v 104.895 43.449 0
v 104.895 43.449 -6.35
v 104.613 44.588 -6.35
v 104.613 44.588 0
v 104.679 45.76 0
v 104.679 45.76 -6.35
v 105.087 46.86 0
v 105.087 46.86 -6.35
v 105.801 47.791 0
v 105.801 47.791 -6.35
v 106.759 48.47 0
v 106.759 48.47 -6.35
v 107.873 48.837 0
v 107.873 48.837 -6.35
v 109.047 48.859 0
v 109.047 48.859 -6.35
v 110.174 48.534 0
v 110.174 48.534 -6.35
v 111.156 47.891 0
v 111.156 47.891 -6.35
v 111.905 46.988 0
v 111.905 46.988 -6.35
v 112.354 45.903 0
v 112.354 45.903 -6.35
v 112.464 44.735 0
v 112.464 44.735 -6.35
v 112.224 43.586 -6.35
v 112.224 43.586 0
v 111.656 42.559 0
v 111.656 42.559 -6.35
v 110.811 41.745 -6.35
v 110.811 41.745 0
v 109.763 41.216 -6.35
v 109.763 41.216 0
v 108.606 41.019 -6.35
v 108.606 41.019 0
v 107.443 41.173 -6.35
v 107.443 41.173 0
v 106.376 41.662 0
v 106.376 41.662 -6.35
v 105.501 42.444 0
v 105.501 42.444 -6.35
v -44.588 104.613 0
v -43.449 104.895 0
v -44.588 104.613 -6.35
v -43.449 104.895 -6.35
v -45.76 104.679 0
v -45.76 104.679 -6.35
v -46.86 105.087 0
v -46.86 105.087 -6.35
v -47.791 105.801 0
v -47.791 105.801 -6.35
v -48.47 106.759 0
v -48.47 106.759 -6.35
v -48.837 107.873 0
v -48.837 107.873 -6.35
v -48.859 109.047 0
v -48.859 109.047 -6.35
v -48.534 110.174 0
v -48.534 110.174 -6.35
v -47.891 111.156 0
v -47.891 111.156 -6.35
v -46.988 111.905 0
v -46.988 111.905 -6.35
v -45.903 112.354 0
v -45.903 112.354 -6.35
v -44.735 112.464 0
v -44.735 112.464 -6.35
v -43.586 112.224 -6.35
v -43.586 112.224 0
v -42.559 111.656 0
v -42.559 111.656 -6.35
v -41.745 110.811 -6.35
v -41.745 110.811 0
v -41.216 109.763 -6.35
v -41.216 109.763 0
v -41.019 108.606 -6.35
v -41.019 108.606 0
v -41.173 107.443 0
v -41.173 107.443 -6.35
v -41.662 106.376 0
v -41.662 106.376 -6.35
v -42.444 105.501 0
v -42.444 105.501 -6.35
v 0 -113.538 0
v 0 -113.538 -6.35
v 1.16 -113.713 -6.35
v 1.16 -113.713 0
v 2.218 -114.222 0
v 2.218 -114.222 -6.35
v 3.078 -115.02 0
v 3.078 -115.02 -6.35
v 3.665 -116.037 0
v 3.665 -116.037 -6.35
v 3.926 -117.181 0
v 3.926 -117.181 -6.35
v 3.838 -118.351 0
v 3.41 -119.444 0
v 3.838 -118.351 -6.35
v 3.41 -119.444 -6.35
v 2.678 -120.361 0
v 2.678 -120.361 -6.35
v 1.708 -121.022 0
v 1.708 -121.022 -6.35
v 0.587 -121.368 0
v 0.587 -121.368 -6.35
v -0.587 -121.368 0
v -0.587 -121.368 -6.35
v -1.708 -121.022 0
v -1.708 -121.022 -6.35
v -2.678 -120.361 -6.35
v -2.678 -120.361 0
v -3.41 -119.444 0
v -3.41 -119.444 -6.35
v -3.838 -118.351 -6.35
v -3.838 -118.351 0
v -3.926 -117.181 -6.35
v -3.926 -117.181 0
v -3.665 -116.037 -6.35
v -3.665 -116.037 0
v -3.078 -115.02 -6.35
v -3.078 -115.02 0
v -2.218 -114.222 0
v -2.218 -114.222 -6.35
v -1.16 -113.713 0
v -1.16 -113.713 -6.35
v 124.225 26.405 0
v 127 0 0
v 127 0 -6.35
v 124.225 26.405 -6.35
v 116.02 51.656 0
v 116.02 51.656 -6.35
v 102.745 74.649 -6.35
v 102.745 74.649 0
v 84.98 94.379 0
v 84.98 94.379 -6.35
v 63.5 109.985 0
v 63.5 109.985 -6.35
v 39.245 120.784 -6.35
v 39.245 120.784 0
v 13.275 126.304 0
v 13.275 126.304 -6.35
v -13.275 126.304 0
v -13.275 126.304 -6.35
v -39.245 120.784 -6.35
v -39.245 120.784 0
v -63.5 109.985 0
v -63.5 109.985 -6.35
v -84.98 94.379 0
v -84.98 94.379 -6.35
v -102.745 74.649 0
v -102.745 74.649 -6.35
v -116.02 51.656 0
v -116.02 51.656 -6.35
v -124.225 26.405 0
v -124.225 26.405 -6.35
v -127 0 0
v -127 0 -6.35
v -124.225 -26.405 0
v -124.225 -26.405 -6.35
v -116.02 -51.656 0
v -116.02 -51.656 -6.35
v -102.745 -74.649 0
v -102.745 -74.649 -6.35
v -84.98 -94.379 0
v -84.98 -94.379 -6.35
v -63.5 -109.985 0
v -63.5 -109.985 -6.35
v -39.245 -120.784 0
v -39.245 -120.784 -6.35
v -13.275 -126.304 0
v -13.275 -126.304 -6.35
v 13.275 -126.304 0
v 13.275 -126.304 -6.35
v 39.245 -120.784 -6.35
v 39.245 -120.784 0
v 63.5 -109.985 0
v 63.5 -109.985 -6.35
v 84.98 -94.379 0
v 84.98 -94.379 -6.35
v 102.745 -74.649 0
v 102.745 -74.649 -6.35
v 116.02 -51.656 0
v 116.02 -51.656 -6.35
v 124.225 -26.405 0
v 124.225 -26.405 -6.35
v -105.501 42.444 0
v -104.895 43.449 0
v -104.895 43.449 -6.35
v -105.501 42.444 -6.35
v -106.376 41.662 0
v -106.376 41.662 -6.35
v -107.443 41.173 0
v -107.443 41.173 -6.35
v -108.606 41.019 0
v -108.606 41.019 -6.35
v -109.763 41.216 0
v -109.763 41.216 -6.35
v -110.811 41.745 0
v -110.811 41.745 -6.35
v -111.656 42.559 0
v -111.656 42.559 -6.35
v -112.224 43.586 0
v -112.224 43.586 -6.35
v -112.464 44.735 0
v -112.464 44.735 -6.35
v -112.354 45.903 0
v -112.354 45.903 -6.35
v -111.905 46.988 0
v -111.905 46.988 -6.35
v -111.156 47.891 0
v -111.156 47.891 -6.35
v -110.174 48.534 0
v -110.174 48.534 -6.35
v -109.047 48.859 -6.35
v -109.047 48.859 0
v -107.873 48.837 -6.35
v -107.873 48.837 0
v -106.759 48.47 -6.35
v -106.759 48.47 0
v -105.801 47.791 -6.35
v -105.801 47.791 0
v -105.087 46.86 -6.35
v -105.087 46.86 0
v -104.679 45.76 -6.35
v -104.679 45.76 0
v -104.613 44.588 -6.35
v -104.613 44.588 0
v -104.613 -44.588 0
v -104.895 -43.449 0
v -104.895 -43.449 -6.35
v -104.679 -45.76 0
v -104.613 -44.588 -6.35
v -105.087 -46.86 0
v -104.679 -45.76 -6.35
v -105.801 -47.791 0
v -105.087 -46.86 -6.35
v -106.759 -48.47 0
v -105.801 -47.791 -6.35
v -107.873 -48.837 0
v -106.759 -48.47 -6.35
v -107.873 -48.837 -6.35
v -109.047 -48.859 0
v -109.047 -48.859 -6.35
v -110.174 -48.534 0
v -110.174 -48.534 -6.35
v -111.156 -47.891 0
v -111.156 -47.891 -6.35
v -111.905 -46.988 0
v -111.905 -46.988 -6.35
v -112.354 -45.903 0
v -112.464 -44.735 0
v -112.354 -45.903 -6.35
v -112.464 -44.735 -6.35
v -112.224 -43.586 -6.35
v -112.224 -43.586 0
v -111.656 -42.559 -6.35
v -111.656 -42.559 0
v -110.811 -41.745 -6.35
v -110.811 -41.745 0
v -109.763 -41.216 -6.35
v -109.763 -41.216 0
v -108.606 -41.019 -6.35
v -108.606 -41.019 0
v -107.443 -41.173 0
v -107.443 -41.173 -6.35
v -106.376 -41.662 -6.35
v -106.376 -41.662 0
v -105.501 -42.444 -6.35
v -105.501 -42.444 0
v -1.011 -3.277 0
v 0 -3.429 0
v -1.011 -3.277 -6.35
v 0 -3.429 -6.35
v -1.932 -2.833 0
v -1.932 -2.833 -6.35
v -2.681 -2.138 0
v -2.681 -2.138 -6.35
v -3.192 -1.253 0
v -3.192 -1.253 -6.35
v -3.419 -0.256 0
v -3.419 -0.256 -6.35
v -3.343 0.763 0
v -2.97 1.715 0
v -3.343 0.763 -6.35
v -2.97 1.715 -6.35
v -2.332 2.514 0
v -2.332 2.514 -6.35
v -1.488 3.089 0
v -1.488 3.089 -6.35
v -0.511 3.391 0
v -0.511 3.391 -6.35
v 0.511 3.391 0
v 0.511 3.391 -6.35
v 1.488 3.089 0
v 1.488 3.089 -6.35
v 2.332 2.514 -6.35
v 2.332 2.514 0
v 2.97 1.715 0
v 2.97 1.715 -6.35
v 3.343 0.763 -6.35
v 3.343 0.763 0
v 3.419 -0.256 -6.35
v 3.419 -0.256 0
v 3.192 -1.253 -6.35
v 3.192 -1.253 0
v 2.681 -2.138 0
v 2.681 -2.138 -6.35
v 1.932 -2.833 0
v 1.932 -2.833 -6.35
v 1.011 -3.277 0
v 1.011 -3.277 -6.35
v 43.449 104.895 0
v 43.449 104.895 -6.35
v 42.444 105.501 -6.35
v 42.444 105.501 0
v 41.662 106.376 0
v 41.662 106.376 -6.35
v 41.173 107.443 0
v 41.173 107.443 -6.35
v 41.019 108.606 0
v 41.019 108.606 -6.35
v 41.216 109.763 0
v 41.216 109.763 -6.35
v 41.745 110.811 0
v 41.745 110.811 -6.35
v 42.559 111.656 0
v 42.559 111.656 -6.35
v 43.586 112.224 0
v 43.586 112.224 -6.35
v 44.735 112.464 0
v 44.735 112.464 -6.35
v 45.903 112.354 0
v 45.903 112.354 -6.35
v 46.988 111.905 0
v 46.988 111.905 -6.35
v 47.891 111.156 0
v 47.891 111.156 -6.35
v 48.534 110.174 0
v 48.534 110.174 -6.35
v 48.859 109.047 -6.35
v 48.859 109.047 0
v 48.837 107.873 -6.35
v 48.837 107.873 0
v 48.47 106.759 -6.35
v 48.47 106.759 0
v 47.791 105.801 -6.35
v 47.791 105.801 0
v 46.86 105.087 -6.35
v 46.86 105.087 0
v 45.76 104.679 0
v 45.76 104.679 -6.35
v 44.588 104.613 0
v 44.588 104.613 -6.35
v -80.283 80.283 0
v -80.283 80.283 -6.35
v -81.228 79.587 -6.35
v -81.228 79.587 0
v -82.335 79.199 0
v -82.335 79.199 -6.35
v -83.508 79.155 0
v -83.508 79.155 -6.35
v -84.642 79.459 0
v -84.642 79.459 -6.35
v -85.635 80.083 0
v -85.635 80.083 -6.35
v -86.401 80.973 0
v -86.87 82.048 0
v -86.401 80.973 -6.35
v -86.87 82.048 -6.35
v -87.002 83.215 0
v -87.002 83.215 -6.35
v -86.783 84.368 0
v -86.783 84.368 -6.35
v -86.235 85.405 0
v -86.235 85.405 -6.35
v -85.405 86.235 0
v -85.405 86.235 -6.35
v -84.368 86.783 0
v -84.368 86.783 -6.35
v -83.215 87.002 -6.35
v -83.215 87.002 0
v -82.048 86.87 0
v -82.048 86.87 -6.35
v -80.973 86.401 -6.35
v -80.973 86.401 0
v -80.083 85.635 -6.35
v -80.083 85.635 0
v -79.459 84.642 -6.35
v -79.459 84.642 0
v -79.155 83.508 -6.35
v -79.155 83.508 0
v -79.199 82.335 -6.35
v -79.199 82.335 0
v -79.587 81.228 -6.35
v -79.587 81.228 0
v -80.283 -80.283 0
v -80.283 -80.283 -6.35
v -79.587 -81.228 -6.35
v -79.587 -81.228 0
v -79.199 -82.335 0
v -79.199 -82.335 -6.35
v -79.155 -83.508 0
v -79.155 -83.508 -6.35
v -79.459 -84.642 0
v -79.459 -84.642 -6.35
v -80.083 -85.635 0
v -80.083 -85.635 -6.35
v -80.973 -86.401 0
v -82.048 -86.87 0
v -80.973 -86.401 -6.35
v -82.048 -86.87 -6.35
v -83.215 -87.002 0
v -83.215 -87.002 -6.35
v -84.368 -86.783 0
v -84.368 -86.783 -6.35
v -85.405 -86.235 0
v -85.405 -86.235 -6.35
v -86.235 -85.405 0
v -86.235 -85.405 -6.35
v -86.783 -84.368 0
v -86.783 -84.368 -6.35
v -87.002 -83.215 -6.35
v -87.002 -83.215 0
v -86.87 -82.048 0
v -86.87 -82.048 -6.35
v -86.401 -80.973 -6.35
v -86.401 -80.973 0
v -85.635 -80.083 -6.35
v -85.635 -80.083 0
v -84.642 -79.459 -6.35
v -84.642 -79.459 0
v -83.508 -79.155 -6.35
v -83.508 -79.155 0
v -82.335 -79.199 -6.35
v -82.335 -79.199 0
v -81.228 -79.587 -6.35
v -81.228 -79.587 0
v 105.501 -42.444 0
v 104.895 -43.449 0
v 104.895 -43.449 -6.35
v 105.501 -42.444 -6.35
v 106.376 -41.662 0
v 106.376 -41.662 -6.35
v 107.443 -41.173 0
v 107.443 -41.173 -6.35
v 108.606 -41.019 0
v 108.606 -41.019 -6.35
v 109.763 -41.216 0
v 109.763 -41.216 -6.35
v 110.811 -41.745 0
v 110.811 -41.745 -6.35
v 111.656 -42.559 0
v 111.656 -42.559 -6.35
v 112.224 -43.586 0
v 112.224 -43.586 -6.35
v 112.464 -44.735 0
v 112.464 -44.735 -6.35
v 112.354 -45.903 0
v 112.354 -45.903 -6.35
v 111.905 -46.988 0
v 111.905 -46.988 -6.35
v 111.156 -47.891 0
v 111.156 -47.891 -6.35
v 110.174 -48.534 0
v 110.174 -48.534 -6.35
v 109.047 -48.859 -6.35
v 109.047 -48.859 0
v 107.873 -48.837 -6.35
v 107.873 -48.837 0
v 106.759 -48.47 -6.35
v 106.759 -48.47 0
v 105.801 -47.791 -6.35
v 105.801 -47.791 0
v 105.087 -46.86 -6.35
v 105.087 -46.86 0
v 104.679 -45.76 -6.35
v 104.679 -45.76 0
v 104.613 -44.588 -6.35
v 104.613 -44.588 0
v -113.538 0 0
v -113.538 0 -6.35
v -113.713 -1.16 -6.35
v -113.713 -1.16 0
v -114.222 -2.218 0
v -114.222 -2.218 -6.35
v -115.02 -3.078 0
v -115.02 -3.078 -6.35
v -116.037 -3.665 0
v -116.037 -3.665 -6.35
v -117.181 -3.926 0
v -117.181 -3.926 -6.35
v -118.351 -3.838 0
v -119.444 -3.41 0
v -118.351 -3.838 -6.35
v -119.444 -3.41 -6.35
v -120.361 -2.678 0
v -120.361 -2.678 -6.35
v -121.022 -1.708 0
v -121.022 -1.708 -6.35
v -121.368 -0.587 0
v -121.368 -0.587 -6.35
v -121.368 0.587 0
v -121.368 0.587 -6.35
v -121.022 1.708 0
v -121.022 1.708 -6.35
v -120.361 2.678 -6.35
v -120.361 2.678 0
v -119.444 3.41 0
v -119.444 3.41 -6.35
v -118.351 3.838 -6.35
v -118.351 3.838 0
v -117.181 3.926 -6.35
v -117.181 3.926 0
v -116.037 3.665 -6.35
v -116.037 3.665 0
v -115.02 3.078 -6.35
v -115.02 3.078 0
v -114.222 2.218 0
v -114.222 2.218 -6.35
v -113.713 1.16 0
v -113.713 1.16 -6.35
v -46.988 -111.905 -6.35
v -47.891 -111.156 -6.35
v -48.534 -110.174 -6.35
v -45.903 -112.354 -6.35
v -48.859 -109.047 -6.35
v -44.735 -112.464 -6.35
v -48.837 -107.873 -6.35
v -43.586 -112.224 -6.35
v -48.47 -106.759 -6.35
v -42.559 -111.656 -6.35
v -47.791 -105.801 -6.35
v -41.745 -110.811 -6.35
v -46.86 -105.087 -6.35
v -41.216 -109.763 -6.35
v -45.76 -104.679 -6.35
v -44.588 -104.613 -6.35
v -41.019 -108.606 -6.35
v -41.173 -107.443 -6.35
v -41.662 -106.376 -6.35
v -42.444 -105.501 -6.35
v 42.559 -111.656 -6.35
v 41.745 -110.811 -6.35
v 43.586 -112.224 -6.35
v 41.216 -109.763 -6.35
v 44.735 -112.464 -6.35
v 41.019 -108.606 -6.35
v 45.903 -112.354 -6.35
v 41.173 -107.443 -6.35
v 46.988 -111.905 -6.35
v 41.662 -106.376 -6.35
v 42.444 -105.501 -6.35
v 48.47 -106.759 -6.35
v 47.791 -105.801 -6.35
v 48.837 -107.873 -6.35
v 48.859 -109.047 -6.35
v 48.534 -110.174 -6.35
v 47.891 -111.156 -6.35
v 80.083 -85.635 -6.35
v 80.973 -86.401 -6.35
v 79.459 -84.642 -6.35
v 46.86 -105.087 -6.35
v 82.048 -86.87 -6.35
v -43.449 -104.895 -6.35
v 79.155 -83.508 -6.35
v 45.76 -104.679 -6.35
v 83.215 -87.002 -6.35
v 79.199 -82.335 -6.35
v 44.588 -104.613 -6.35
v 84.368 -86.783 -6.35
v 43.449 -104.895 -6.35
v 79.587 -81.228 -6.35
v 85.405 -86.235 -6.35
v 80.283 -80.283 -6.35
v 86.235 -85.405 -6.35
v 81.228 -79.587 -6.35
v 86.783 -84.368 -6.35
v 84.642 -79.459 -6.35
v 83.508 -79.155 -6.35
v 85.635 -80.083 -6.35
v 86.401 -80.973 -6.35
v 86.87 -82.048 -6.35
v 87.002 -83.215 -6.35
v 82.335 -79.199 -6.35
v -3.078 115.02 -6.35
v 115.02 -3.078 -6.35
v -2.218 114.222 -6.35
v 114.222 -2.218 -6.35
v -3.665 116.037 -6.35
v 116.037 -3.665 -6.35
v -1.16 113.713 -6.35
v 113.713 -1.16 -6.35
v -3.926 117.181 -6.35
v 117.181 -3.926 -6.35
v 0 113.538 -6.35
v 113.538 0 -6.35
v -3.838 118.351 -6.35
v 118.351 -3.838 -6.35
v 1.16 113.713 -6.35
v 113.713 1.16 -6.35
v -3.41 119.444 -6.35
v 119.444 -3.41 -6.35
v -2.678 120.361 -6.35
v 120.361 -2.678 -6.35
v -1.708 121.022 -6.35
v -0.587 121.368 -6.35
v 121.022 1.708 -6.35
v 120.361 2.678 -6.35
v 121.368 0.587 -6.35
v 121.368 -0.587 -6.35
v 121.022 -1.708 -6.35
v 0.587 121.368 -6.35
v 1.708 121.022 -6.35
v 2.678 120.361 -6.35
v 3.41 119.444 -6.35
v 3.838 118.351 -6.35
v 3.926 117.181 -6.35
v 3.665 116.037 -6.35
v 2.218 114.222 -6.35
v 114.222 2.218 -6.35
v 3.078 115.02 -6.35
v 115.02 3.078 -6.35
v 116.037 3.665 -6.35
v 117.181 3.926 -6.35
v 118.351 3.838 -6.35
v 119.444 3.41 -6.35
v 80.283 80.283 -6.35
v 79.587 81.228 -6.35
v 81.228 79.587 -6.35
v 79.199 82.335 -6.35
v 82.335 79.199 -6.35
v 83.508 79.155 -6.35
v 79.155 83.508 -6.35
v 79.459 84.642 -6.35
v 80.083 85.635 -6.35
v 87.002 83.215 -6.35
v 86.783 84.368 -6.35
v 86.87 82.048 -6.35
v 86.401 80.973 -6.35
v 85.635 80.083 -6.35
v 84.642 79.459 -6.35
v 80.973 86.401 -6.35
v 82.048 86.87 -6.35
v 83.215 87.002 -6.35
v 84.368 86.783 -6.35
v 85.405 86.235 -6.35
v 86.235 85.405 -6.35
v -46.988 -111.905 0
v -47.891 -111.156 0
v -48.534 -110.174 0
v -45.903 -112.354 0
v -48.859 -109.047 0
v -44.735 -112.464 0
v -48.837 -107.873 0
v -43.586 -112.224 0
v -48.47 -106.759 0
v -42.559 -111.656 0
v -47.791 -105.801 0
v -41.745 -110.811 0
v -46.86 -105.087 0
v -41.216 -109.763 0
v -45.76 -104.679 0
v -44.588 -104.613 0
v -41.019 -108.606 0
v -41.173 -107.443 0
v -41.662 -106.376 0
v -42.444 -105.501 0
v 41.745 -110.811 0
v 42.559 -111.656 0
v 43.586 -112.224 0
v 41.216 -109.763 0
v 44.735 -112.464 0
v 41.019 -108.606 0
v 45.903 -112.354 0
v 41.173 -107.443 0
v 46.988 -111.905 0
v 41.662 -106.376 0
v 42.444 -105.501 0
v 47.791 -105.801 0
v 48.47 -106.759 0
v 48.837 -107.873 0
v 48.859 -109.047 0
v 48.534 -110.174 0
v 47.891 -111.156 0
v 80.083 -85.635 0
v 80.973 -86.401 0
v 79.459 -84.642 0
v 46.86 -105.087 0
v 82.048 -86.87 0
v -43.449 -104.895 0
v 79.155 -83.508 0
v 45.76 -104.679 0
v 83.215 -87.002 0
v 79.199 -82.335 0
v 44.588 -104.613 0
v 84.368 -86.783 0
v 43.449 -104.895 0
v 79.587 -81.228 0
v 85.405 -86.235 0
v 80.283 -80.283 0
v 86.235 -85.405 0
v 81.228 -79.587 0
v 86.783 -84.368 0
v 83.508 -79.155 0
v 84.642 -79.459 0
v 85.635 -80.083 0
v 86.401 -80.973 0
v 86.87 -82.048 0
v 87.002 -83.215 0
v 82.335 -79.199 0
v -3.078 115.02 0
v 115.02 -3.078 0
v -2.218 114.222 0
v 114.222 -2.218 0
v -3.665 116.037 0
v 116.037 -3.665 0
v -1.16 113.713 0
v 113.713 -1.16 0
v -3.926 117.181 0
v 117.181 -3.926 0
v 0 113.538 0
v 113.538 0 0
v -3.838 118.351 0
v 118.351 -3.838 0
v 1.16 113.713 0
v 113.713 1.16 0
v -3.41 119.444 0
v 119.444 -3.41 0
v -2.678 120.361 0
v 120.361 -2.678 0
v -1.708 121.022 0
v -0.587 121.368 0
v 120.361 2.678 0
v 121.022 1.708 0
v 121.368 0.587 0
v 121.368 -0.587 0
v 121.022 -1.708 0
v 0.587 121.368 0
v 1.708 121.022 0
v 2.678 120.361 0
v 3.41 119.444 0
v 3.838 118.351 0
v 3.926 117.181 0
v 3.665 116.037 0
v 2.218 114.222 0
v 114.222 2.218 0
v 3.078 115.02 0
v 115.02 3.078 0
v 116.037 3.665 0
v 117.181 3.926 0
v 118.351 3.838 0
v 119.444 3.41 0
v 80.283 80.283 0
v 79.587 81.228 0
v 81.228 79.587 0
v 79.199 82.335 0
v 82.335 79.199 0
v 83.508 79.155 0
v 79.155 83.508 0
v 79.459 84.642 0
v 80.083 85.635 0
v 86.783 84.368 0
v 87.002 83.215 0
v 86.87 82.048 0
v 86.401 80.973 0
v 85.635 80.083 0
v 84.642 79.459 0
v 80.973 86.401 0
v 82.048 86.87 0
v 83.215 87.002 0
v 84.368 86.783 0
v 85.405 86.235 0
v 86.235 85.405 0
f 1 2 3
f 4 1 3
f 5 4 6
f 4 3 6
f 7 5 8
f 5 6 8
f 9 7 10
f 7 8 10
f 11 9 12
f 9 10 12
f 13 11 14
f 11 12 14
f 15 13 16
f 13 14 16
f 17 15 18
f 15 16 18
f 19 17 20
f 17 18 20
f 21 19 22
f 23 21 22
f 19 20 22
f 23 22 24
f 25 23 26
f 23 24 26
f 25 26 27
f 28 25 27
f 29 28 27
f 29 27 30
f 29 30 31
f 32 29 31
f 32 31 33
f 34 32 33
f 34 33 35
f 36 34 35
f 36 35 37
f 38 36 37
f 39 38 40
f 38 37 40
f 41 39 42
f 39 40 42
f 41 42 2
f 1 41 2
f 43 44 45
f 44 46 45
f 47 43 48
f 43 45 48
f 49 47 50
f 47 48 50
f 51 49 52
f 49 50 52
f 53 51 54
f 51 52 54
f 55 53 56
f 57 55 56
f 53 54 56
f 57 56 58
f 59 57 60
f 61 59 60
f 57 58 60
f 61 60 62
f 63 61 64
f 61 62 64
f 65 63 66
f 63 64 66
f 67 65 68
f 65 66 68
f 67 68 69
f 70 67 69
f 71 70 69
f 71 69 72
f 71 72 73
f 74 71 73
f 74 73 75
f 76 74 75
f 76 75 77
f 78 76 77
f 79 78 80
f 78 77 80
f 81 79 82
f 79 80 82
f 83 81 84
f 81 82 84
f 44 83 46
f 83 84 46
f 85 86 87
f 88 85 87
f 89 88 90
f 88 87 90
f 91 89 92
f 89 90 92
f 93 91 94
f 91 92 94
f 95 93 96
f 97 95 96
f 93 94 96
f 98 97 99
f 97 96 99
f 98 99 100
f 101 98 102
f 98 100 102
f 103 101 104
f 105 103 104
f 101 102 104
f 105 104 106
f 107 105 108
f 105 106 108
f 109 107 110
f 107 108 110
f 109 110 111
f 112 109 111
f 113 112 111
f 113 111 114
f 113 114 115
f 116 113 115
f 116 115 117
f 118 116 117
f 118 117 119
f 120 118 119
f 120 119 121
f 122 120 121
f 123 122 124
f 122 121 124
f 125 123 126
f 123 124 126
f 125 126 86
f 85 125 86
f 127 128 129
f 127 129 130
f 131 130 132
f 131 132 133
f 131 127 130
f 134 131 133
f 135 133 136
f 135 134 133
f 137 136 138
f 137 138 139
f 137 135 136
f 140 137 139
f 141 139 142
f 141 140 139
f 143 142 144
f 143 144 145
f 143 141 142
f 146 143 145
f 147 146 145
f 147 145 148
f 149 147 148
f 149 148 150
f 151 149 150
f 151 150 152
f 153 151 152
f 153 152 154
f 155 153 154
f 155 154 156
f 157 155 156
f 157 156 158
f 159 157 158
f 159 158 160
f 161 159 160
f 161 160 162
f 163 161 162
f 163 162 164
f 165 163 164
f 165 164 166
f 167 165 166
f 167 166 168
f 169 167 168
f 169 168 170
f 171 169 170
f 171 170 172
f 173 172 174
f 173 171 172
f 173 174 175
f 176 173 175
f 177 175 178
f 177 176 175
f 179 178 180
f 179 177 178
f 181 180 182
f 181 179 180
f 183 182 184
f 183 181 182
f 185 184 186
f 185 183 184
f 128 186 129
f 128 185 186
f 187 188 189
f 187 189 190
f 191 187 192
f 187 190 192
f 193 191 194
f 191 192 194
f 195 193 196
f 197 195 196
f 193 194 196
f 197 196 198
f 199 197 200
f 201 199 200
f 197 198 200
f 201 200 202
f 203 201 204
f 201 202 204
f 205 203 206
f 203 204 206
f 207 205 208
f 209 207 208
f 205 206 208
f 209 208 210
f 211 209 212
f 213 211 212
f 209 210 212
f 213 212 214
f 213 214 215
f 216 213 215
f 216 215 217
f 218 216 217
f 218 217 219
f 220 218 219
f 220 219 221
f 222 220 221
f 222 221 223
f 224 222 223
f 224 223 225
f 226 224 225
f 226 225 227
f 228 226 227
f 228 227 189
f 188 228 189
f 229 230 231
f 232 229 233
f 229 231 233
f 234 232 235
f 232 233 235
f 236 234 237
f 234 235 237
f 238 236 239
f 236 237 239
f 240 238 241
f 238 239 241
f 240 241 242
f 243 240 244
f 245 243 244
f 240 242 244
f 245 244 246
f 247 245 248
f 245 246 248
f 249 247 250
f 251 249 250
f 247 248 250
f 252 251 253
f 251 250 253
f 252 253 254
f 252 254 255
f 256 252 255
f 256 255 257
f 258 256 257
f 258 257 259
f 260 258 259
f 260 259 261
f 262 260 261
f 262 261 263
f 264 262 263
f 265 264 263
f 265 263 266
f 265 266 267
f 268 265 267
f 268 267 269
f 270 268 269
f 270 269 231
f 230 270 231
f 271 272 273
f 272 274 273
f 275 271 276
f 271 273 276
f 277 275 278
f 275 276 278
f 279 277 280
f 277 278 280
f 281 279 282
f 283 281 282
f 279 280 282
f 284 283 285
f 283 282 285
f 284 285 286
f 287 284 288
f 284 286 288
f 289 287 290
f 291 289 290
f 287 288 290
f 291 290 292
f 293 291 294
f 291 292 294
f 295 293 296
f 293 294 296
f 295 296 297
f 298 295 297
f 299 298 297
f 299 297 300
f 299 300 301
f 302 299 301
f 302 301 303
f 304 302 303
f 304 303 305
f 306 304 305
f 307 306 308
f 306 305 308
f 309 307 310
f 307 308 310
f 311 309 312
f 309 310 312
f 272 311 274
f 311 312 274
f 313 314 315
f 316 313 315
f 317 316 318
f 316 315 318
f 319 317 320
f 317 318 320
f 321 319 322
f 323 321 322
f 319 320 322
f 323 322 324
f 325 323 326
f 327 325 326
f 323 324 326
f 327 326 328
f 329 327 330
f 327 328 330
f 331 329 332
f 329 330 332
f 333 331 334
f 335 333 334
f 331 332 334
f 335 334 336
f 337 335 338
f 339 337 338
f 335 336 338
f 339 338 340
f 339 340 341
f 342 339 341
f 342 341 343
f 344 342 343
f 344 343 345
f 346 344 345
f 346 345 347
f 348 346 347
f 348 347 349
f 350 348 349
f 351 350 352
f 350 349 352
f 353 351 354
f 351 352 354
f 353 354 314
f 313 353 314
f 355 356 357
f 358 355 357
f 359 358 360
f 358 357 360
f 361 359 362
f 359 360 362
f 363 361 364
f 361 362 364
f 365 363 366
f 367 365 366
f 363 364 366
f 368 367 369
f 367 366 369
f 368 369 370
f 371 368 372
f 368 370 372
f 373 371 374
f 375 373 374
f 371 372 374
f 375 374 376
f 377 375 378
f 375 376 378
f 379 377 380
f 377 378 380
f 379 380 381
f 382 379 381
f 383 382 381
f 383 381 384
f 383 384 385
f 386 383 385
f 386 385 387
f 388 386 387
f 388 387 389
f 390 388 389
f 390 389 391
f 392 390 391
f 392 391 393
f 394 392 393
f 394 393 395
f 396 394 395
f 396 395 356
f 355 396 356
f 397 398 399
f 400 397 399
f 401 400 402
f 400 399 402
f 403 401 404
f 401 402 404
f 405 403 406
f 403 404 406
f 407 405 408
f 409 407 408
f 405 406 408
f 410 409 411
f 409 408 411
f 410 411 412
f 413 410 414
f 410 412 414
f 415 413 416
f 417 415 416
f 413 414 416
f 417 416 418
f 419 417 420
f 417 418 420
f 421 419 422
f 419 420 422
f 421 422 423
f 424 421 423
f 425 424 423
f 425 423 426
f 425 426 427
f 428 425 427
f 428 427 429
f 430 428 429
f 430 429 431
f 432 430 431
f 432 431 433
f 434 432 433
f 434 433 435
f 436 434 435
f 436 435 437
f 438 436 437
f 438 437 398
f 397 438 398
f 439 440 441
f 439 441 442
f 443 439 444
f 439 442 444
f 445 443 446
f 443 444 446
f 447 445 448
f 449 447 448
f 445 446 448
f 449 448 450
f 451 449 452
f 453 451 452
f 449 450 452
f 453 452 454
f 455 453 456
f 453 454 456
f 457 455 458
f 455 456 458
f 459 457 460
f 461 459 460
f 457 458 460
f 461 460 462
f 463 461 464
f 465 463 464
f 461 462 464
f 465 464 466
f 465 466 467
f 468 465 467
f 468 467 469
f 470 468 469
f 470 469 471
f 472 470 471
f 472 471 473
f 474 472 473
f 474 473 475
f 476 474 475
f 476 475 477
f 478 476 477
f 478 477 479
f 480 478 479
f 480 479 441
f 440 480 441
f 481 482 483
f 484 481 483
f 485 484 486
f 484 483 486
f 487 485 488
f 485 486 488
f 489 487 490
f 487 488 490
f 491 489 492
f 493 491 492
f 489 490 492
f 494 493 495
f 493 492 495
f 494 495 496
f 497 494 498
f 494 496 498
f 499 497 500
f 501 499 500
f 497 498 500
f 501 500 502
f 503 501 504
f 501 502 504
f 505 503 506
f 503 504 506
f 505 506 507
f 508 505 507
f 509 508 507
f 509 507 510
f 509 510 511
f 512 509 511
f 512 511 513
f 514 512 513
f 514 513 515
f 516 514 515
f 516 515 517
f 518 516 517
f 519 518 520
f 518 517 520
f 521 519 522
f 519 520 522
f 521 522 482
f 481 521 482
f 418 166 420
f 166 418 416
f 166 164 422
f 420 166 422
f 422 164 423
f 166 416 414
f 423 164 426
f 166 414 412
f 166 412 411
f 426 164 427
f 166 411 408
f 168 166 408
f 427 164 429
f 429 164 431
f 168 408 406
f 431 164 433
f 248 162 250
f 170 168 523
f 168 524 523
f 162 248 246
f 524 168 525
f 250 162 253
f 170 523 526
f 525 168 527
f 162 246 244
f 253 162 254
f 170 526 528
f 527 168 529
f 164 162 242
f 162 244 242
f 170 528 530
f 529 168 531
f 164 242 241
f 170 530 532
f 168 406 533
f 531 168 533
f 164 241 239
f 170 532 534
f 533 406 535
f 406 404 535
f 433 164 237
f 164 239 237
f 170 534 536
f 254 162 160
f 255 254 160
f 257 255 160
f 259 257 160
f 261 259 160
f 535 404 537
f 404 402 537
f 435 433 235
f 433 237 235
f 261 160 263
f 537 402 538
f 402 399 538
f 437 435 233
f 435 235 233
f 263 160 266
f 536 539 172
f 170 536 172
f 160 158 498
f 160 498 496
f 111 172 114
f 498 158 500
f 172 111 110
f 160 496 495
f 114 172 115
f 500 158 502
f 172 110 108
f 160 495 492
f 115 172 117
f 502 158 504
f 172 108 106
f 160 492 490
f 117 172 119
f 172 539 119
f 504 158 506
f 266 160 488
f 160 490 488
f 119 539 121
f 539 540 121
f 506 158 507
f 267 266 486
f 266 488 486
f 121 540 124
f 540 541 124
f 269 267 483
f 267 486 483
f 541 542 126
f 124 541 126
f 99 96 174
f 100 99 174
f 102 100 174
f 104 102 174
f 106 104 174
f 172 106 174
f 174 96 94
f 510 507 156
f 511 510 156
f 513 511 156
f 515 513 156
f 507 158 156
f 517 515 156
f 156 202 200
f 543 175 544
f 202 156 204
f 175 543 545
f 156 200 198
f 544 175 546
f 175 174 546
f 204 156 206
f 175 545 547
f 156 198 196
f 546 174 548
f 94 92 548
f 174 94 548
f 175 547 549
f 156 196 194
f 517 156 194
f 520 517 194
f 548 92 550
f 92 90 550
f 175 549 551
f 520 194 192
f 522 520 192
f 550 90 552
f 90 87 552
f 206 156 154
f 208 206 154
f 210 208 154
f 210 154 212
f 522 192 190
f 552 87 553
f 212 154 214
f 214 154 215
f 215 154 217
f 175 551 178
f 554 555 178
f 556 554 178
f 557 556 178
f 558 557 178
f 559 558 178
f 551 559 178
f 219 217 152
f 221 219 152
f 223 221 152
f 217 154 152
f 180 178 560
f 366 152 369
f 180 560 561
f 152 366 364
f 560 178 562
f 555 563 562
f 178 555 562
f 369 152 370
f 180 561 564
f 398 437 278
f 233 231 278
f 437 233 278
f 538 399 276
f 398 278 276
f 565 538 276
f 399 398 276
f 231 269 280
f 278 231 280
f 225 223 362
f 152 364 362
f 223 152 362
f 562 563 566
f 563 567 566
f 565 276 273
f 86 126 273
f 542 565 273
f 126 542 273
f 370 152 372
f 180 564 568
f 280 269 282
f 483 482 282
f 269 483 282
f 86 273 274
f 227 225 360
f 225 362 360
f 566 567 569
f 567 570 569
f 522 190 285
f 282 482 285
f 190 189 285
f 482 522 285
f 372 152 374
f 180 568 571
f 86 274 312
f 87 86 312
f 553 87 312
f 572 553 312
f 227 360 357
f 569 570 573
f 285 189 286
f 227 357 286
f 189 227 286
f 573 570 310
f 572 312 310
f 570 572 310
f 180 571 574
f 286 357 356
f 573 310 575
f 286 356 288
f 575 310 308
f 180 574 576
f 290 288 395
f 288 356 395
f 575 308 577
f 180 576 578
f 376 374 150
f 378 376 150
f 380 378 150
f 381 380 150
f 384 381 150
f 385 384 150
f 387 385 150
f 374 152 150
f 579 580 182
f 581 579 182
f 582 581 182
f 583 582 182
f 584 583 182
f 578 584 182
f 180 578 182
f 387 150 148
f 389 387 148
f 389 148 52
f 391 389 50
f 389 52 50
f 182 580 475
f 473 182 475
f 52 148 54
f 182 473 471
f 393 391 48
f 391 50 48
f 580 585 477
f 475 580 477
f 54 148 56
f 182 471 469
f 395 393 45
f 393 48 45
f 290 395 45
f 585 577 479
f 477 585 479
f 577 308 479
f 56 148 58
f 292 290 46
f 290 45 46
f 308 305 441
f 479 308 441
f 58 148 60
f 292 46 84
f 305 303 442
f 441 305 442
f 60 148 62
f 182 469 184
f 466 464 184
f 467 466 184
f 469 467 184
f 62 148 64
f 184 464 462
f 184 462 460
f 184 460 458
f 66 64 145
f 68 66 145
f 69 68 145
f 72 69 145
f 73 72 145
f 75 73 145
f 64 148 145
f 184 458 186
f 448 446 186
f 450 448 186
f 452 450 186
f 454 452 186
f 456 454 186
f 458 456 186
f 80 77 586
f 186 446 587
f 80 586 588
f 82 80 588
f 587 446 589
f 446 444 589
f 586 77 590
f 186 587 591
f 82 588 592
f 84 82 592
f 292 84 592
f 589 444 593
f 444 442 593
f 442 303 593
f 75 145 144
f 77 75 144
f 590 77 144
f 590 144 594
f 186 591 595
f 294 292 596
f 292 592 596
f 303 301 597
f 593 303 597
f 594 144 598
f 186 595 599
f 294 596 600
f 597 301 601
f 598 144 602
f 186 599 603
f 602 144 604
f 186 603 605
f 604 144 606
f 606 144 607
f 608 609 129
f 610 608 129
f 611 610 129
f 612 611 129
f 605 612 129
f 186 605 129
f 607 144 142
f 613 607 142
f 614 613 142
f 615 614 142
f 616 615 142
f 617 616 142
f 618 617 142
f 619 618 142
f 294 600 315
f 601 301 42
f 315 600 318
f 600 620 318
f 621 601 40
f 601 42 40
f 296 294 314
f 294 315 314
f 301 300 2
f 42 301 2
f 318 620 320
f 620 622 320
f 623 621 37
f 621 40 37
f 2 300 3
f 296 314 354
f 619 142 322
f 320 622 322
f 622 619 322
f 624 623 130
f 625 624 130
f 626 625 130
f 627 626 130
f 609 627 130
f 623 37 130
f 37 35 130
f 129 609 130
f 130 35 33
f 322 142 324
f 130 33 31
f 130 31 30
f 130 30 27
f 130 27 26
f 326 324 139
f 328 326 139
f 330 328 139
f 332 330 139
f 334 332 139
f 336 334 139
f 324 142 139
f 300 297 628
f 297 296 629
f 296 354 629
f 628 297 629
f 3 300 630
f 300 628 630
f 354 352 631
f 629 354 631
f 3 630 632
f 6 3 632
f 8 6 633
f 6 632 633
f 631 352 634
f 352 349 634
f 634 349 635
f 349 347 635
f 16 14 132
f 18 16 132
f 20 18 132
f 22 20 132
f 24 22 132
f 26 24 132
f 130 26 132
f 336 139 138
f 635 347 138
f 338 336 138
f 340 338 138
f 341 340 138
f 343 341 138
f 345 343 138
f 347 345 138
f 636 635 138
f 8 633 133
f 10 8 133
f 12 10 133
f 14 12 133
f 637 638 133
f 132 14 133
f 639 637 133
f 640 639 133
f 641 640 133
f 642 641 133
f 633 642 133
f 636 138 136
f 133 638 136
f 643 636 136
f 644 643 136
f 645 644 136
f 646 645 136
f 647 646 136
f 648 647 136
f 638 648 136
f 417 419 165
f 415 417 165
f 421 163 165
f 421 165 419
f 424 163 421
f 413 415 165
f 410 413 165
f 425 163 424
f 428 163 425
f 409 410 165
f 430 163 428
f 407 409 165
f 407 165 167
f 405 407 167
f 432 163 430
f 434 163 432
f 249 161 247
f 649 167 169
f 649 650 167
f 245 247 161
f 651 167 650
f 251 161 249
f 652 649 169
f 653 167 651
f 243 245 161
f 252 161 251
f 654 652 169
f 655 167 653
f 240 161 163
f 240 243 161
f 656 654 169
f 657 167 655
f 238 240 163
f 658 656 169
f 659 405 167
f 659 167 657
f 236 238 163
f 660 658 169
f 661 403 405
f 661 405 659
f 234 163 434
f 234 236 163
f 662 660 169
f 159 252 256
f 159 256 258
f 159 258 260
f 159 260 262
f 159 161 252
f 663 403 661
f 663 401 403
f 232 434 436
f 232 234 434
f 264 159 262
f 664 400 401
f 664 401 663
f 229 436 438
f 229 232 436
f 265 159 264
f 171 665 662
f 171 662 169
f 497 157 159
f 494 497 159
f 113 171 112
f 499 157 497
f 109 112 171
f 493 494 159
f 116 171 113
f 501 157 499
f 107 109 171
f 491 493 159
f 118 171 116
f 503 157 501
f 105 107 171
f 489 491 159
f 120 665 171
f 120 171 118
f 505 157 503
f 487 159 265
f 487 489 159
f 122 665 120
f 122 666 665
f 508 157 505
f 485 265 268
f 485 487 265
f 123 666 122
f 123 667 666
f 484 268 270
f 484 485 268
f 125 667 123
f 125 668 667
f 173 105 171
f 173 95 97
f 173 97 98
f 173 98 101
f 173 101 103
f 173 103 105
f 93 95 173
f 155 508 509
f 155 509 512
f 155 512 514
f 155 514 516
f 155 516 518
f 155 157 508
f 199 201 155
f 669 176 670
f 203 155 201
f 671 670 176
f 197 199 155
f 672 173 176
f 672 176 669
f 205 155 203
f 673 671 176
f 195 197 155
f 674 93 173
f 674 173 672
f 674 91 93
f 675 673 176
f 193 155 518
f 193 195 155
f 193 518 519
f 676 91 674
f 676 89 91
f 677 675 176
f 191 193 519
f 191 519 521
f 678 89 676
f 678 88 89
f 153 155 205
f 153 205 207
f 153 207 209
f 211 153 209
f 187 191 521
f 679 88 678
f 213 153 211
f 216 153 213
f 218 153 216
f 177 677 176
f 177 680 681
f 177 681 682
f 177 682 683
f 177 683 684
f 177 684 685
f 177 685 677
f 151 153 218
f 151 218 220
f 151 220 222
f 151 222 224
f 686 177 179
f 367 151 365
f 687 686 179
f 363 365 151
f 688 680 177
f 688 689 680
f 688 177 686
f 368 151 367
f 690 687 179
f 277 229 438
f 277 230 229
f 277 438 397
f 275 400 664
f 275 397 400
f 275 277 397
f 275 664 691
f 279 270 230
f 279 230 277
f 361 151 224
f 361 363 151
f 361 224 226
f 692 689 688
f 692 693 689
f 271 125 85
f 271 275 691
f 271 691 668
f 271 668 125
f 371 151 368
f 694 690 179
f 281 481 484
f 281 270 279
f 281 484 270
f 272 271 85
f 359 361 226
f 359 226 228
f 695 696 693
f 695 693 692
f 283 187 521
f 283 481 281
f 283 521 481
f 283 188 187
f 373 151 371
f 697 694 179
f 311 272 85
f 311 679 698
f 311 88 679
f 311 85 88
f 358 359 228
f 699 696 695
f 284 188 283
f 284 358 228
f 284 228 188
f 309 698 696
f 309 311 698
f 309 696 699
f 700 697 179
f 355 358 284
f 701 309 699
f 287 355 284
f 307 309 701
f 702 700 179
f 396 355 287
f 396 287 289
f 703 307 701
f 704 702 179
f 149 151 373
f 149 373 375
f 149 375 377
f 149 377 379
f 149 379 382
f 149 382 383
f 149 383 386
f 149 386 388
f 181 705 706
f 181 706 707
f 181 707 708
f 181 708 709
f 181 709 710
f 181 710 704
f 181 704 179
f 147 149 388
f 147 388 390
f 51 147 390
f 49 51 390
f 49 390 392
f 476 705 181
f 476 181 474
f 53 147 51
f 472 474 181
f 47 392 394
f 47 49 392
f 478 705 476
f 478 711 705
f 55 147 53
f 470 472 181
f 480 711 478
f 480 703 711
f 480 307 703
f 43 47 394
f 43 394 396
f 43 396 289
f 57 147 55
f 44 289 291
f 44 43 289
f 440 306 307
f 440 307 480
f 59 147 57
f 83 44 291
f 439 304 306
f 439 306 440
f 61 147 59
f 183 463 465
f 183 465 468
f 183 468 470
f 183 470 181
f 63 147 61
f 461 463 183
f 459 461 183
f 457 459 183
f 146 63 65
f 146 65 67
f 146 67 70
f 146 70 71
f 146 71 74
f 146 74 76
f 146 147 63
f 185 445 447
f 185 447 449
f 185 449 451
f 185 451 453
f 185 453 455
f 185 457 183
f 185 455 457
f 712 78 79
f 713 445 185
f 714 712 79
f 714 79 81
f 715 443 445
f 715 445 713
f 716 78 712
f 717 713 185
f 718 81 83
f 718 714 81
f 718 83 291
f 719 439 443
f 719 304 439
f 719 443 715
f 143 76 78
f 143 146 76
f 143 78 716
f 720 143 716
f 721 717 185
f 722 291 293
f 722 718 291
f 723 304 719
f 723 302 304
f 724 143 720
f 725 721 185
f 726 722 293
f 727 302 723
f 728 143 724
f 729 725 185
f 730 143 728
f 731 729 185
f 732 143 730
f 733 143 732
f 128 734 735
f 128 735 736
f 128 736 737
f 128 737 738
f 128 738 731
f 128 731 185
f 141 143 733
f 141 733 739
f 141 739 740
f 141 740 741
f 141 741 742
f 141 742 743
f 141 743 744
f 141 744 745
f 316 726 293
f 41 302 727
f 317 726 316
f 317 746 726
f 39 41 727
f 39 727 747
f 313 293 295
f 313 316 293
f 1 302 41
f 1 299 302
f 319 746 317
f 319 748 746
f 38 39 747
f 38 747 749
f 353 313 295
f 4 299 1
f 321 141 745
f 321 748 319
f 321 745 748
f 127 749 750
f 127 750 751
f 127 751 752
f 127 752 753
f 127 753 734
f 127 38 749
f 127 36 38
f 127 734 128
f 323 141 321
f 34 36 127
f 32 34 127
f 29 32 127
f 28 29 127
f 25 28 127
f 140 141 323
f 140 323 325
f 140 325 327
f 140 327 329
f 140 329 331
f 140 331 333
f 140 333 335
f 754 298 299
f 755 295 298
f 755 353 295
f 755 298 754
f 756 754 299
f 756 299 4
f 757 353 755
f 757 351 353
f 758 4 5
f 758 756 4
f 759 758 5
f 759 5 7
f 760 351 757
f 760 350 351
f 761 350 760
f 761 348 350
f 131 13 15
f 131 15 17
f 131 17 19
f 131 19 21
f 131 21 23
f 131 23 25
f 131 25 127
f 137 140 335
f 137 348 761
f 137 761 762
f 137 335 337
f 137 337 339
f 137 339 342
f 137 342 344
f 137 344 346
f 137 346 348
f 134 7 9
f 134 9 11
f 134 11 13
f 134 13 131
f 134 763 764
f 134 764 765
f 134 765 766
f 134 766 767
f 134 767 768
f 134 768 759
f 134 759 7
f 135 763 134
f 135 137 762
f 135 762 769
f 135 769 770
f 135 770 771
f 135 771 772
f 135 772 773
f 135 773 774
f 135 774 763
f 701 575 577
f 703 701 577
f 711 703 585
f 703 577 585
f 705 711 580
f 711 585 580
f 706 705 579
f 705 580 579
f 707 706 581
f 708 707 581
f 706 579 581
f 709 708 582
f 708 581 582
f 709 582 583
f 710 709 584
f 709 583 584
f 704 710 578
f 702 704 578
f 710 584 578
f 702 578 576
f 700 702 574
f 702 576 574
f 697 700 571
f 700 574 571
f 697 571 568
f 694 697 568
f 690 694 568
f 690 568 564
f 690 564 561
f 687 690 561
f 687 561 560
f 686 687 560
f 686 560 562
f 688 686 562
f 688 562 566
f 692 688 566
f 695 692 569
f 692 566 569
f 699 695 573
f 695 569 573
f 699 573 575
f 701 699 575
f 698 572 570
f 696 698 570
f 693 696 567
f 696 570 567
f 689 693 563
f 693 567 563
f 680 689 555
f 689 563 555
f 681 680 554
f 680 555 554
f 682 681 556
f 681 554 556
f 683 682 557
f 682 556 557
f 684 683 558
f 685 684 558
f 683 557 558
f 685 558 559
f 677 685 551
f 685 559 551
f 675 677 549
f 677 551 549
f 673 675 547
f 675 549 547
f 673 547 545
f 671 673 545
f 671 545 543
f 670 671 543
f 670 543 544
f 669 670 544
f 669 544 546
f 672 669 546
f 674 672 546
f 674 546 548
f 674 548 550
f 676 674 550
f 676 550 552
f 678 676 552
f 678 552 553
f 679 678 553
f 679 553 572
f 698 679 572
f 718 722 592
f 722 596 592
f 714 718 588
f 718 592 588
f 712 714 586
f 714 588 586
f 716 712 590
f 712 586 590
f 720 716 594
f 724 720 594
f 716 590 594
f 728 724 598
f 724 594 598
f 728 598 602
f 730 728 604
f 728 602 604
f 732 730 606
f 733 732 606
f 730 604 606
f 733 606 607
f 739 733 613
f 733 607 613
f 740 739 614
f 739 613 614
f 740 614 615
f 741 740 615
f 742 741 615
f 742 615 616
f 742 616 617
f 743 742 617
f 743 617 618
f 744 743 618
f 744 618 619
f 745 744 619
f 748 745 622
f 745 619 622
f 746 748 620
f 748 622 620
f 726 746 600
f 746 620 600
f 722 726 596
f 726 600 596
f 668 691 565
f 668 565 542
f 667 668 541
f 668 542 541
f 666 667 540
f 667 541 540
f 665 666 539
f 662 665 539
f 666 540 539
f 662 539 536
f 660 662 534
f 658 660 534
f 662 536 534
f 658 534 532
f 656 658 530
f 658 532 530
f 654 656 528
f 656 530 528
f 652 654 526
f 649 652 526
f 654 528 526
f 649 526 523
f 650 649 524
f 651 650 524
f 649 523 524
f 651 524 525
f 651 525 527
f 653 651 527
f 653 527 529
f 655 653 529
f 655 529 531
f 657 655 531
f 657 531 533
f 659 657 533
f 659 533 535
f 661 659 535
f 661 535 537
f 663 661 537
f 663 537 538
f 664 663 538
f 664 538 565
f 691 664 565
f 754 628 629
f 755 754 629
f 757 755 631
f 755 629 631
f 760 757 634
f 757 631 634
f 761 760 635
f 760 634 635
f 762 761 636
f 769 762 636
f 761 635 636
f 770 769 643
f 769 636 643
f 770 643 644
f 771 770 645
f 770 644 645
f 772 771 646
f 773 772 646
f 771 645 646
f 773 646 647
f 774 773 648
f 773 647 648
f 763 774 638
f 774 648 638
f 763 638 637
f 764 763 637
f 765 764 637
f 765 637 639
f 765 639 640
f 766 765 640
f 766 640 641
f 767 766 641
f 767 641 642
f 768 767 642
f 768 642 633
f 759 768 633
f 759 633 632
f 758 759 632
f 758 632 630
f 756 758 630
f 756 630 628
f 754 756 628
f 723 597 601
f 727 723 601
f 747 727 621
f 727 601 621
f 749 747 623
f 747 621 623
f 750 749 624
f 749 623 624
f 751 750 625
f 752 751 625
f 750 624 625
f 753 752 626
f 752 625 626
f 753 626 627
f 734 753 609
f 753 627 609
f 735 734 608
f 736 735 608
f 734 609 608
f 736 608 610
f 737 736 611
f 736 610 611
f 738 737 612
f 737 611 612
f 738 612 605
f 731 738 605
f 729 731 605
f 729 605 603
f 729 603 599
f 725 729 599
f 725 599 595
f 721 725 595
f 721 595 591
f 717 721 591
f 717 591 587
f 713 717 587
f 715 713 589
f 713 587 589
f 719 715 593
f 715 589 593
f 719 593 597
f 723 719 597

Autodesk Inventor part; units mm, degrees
ref_plane "YZ Plane" through (0, 0, 0) normal (1, 0, 0) x (0, 1, 0)
ref_plane "XZ Plane" through (0, 0, 0) normal (0, 1, 0) x (-1, 0, 0)
ref_plane "XY Plane" through (0, 0, 0) normal (0, 0, 1) x (1, 0, 0)
sketch "Sketch1" plane through (0, 0, 0) normal (0, 0, 1) x (1, 0, 0)
  circle A0 centre (0, 0) radius 127
  dimension "d2" = 254
extrude "Extrusion1" add sketch "Sketch1" against normal blind 6.35
sketch "Sketch2" plane through (0, 0, 0) normal (0, 0, 1) x (1, 0, 0)
  circle A0 centre (0, 0) radius 127 projected
hole "Hole1" at (0, 0, 0) direction (0, 0, -1) diameter 6.858 end through all
sketch "Sketch3" plane through (0, 0, 0) normal (0, 0, 1) x (1, 0, 0)
  circle A0 centre (0, 0) radius 3.429 projected
  circle A1 centre (0, 0) radius 127 projected
  circle A2 centre (0, 0) radius 117.475 construction
  point P0 (0, 117.475)
  dimension "d11" = 234.95
hole "Hole2" at (0, 117.475, 0) direction (0, 0, -1) diameter 7.874 end through all
pattern_circular "Circular Pattern1" count 16 over 360 about axis through (0, 0, 0) along (0, 0, -1) of "Hole2"
properties part number "GE-13036" material "Polyethylene, High Density"
